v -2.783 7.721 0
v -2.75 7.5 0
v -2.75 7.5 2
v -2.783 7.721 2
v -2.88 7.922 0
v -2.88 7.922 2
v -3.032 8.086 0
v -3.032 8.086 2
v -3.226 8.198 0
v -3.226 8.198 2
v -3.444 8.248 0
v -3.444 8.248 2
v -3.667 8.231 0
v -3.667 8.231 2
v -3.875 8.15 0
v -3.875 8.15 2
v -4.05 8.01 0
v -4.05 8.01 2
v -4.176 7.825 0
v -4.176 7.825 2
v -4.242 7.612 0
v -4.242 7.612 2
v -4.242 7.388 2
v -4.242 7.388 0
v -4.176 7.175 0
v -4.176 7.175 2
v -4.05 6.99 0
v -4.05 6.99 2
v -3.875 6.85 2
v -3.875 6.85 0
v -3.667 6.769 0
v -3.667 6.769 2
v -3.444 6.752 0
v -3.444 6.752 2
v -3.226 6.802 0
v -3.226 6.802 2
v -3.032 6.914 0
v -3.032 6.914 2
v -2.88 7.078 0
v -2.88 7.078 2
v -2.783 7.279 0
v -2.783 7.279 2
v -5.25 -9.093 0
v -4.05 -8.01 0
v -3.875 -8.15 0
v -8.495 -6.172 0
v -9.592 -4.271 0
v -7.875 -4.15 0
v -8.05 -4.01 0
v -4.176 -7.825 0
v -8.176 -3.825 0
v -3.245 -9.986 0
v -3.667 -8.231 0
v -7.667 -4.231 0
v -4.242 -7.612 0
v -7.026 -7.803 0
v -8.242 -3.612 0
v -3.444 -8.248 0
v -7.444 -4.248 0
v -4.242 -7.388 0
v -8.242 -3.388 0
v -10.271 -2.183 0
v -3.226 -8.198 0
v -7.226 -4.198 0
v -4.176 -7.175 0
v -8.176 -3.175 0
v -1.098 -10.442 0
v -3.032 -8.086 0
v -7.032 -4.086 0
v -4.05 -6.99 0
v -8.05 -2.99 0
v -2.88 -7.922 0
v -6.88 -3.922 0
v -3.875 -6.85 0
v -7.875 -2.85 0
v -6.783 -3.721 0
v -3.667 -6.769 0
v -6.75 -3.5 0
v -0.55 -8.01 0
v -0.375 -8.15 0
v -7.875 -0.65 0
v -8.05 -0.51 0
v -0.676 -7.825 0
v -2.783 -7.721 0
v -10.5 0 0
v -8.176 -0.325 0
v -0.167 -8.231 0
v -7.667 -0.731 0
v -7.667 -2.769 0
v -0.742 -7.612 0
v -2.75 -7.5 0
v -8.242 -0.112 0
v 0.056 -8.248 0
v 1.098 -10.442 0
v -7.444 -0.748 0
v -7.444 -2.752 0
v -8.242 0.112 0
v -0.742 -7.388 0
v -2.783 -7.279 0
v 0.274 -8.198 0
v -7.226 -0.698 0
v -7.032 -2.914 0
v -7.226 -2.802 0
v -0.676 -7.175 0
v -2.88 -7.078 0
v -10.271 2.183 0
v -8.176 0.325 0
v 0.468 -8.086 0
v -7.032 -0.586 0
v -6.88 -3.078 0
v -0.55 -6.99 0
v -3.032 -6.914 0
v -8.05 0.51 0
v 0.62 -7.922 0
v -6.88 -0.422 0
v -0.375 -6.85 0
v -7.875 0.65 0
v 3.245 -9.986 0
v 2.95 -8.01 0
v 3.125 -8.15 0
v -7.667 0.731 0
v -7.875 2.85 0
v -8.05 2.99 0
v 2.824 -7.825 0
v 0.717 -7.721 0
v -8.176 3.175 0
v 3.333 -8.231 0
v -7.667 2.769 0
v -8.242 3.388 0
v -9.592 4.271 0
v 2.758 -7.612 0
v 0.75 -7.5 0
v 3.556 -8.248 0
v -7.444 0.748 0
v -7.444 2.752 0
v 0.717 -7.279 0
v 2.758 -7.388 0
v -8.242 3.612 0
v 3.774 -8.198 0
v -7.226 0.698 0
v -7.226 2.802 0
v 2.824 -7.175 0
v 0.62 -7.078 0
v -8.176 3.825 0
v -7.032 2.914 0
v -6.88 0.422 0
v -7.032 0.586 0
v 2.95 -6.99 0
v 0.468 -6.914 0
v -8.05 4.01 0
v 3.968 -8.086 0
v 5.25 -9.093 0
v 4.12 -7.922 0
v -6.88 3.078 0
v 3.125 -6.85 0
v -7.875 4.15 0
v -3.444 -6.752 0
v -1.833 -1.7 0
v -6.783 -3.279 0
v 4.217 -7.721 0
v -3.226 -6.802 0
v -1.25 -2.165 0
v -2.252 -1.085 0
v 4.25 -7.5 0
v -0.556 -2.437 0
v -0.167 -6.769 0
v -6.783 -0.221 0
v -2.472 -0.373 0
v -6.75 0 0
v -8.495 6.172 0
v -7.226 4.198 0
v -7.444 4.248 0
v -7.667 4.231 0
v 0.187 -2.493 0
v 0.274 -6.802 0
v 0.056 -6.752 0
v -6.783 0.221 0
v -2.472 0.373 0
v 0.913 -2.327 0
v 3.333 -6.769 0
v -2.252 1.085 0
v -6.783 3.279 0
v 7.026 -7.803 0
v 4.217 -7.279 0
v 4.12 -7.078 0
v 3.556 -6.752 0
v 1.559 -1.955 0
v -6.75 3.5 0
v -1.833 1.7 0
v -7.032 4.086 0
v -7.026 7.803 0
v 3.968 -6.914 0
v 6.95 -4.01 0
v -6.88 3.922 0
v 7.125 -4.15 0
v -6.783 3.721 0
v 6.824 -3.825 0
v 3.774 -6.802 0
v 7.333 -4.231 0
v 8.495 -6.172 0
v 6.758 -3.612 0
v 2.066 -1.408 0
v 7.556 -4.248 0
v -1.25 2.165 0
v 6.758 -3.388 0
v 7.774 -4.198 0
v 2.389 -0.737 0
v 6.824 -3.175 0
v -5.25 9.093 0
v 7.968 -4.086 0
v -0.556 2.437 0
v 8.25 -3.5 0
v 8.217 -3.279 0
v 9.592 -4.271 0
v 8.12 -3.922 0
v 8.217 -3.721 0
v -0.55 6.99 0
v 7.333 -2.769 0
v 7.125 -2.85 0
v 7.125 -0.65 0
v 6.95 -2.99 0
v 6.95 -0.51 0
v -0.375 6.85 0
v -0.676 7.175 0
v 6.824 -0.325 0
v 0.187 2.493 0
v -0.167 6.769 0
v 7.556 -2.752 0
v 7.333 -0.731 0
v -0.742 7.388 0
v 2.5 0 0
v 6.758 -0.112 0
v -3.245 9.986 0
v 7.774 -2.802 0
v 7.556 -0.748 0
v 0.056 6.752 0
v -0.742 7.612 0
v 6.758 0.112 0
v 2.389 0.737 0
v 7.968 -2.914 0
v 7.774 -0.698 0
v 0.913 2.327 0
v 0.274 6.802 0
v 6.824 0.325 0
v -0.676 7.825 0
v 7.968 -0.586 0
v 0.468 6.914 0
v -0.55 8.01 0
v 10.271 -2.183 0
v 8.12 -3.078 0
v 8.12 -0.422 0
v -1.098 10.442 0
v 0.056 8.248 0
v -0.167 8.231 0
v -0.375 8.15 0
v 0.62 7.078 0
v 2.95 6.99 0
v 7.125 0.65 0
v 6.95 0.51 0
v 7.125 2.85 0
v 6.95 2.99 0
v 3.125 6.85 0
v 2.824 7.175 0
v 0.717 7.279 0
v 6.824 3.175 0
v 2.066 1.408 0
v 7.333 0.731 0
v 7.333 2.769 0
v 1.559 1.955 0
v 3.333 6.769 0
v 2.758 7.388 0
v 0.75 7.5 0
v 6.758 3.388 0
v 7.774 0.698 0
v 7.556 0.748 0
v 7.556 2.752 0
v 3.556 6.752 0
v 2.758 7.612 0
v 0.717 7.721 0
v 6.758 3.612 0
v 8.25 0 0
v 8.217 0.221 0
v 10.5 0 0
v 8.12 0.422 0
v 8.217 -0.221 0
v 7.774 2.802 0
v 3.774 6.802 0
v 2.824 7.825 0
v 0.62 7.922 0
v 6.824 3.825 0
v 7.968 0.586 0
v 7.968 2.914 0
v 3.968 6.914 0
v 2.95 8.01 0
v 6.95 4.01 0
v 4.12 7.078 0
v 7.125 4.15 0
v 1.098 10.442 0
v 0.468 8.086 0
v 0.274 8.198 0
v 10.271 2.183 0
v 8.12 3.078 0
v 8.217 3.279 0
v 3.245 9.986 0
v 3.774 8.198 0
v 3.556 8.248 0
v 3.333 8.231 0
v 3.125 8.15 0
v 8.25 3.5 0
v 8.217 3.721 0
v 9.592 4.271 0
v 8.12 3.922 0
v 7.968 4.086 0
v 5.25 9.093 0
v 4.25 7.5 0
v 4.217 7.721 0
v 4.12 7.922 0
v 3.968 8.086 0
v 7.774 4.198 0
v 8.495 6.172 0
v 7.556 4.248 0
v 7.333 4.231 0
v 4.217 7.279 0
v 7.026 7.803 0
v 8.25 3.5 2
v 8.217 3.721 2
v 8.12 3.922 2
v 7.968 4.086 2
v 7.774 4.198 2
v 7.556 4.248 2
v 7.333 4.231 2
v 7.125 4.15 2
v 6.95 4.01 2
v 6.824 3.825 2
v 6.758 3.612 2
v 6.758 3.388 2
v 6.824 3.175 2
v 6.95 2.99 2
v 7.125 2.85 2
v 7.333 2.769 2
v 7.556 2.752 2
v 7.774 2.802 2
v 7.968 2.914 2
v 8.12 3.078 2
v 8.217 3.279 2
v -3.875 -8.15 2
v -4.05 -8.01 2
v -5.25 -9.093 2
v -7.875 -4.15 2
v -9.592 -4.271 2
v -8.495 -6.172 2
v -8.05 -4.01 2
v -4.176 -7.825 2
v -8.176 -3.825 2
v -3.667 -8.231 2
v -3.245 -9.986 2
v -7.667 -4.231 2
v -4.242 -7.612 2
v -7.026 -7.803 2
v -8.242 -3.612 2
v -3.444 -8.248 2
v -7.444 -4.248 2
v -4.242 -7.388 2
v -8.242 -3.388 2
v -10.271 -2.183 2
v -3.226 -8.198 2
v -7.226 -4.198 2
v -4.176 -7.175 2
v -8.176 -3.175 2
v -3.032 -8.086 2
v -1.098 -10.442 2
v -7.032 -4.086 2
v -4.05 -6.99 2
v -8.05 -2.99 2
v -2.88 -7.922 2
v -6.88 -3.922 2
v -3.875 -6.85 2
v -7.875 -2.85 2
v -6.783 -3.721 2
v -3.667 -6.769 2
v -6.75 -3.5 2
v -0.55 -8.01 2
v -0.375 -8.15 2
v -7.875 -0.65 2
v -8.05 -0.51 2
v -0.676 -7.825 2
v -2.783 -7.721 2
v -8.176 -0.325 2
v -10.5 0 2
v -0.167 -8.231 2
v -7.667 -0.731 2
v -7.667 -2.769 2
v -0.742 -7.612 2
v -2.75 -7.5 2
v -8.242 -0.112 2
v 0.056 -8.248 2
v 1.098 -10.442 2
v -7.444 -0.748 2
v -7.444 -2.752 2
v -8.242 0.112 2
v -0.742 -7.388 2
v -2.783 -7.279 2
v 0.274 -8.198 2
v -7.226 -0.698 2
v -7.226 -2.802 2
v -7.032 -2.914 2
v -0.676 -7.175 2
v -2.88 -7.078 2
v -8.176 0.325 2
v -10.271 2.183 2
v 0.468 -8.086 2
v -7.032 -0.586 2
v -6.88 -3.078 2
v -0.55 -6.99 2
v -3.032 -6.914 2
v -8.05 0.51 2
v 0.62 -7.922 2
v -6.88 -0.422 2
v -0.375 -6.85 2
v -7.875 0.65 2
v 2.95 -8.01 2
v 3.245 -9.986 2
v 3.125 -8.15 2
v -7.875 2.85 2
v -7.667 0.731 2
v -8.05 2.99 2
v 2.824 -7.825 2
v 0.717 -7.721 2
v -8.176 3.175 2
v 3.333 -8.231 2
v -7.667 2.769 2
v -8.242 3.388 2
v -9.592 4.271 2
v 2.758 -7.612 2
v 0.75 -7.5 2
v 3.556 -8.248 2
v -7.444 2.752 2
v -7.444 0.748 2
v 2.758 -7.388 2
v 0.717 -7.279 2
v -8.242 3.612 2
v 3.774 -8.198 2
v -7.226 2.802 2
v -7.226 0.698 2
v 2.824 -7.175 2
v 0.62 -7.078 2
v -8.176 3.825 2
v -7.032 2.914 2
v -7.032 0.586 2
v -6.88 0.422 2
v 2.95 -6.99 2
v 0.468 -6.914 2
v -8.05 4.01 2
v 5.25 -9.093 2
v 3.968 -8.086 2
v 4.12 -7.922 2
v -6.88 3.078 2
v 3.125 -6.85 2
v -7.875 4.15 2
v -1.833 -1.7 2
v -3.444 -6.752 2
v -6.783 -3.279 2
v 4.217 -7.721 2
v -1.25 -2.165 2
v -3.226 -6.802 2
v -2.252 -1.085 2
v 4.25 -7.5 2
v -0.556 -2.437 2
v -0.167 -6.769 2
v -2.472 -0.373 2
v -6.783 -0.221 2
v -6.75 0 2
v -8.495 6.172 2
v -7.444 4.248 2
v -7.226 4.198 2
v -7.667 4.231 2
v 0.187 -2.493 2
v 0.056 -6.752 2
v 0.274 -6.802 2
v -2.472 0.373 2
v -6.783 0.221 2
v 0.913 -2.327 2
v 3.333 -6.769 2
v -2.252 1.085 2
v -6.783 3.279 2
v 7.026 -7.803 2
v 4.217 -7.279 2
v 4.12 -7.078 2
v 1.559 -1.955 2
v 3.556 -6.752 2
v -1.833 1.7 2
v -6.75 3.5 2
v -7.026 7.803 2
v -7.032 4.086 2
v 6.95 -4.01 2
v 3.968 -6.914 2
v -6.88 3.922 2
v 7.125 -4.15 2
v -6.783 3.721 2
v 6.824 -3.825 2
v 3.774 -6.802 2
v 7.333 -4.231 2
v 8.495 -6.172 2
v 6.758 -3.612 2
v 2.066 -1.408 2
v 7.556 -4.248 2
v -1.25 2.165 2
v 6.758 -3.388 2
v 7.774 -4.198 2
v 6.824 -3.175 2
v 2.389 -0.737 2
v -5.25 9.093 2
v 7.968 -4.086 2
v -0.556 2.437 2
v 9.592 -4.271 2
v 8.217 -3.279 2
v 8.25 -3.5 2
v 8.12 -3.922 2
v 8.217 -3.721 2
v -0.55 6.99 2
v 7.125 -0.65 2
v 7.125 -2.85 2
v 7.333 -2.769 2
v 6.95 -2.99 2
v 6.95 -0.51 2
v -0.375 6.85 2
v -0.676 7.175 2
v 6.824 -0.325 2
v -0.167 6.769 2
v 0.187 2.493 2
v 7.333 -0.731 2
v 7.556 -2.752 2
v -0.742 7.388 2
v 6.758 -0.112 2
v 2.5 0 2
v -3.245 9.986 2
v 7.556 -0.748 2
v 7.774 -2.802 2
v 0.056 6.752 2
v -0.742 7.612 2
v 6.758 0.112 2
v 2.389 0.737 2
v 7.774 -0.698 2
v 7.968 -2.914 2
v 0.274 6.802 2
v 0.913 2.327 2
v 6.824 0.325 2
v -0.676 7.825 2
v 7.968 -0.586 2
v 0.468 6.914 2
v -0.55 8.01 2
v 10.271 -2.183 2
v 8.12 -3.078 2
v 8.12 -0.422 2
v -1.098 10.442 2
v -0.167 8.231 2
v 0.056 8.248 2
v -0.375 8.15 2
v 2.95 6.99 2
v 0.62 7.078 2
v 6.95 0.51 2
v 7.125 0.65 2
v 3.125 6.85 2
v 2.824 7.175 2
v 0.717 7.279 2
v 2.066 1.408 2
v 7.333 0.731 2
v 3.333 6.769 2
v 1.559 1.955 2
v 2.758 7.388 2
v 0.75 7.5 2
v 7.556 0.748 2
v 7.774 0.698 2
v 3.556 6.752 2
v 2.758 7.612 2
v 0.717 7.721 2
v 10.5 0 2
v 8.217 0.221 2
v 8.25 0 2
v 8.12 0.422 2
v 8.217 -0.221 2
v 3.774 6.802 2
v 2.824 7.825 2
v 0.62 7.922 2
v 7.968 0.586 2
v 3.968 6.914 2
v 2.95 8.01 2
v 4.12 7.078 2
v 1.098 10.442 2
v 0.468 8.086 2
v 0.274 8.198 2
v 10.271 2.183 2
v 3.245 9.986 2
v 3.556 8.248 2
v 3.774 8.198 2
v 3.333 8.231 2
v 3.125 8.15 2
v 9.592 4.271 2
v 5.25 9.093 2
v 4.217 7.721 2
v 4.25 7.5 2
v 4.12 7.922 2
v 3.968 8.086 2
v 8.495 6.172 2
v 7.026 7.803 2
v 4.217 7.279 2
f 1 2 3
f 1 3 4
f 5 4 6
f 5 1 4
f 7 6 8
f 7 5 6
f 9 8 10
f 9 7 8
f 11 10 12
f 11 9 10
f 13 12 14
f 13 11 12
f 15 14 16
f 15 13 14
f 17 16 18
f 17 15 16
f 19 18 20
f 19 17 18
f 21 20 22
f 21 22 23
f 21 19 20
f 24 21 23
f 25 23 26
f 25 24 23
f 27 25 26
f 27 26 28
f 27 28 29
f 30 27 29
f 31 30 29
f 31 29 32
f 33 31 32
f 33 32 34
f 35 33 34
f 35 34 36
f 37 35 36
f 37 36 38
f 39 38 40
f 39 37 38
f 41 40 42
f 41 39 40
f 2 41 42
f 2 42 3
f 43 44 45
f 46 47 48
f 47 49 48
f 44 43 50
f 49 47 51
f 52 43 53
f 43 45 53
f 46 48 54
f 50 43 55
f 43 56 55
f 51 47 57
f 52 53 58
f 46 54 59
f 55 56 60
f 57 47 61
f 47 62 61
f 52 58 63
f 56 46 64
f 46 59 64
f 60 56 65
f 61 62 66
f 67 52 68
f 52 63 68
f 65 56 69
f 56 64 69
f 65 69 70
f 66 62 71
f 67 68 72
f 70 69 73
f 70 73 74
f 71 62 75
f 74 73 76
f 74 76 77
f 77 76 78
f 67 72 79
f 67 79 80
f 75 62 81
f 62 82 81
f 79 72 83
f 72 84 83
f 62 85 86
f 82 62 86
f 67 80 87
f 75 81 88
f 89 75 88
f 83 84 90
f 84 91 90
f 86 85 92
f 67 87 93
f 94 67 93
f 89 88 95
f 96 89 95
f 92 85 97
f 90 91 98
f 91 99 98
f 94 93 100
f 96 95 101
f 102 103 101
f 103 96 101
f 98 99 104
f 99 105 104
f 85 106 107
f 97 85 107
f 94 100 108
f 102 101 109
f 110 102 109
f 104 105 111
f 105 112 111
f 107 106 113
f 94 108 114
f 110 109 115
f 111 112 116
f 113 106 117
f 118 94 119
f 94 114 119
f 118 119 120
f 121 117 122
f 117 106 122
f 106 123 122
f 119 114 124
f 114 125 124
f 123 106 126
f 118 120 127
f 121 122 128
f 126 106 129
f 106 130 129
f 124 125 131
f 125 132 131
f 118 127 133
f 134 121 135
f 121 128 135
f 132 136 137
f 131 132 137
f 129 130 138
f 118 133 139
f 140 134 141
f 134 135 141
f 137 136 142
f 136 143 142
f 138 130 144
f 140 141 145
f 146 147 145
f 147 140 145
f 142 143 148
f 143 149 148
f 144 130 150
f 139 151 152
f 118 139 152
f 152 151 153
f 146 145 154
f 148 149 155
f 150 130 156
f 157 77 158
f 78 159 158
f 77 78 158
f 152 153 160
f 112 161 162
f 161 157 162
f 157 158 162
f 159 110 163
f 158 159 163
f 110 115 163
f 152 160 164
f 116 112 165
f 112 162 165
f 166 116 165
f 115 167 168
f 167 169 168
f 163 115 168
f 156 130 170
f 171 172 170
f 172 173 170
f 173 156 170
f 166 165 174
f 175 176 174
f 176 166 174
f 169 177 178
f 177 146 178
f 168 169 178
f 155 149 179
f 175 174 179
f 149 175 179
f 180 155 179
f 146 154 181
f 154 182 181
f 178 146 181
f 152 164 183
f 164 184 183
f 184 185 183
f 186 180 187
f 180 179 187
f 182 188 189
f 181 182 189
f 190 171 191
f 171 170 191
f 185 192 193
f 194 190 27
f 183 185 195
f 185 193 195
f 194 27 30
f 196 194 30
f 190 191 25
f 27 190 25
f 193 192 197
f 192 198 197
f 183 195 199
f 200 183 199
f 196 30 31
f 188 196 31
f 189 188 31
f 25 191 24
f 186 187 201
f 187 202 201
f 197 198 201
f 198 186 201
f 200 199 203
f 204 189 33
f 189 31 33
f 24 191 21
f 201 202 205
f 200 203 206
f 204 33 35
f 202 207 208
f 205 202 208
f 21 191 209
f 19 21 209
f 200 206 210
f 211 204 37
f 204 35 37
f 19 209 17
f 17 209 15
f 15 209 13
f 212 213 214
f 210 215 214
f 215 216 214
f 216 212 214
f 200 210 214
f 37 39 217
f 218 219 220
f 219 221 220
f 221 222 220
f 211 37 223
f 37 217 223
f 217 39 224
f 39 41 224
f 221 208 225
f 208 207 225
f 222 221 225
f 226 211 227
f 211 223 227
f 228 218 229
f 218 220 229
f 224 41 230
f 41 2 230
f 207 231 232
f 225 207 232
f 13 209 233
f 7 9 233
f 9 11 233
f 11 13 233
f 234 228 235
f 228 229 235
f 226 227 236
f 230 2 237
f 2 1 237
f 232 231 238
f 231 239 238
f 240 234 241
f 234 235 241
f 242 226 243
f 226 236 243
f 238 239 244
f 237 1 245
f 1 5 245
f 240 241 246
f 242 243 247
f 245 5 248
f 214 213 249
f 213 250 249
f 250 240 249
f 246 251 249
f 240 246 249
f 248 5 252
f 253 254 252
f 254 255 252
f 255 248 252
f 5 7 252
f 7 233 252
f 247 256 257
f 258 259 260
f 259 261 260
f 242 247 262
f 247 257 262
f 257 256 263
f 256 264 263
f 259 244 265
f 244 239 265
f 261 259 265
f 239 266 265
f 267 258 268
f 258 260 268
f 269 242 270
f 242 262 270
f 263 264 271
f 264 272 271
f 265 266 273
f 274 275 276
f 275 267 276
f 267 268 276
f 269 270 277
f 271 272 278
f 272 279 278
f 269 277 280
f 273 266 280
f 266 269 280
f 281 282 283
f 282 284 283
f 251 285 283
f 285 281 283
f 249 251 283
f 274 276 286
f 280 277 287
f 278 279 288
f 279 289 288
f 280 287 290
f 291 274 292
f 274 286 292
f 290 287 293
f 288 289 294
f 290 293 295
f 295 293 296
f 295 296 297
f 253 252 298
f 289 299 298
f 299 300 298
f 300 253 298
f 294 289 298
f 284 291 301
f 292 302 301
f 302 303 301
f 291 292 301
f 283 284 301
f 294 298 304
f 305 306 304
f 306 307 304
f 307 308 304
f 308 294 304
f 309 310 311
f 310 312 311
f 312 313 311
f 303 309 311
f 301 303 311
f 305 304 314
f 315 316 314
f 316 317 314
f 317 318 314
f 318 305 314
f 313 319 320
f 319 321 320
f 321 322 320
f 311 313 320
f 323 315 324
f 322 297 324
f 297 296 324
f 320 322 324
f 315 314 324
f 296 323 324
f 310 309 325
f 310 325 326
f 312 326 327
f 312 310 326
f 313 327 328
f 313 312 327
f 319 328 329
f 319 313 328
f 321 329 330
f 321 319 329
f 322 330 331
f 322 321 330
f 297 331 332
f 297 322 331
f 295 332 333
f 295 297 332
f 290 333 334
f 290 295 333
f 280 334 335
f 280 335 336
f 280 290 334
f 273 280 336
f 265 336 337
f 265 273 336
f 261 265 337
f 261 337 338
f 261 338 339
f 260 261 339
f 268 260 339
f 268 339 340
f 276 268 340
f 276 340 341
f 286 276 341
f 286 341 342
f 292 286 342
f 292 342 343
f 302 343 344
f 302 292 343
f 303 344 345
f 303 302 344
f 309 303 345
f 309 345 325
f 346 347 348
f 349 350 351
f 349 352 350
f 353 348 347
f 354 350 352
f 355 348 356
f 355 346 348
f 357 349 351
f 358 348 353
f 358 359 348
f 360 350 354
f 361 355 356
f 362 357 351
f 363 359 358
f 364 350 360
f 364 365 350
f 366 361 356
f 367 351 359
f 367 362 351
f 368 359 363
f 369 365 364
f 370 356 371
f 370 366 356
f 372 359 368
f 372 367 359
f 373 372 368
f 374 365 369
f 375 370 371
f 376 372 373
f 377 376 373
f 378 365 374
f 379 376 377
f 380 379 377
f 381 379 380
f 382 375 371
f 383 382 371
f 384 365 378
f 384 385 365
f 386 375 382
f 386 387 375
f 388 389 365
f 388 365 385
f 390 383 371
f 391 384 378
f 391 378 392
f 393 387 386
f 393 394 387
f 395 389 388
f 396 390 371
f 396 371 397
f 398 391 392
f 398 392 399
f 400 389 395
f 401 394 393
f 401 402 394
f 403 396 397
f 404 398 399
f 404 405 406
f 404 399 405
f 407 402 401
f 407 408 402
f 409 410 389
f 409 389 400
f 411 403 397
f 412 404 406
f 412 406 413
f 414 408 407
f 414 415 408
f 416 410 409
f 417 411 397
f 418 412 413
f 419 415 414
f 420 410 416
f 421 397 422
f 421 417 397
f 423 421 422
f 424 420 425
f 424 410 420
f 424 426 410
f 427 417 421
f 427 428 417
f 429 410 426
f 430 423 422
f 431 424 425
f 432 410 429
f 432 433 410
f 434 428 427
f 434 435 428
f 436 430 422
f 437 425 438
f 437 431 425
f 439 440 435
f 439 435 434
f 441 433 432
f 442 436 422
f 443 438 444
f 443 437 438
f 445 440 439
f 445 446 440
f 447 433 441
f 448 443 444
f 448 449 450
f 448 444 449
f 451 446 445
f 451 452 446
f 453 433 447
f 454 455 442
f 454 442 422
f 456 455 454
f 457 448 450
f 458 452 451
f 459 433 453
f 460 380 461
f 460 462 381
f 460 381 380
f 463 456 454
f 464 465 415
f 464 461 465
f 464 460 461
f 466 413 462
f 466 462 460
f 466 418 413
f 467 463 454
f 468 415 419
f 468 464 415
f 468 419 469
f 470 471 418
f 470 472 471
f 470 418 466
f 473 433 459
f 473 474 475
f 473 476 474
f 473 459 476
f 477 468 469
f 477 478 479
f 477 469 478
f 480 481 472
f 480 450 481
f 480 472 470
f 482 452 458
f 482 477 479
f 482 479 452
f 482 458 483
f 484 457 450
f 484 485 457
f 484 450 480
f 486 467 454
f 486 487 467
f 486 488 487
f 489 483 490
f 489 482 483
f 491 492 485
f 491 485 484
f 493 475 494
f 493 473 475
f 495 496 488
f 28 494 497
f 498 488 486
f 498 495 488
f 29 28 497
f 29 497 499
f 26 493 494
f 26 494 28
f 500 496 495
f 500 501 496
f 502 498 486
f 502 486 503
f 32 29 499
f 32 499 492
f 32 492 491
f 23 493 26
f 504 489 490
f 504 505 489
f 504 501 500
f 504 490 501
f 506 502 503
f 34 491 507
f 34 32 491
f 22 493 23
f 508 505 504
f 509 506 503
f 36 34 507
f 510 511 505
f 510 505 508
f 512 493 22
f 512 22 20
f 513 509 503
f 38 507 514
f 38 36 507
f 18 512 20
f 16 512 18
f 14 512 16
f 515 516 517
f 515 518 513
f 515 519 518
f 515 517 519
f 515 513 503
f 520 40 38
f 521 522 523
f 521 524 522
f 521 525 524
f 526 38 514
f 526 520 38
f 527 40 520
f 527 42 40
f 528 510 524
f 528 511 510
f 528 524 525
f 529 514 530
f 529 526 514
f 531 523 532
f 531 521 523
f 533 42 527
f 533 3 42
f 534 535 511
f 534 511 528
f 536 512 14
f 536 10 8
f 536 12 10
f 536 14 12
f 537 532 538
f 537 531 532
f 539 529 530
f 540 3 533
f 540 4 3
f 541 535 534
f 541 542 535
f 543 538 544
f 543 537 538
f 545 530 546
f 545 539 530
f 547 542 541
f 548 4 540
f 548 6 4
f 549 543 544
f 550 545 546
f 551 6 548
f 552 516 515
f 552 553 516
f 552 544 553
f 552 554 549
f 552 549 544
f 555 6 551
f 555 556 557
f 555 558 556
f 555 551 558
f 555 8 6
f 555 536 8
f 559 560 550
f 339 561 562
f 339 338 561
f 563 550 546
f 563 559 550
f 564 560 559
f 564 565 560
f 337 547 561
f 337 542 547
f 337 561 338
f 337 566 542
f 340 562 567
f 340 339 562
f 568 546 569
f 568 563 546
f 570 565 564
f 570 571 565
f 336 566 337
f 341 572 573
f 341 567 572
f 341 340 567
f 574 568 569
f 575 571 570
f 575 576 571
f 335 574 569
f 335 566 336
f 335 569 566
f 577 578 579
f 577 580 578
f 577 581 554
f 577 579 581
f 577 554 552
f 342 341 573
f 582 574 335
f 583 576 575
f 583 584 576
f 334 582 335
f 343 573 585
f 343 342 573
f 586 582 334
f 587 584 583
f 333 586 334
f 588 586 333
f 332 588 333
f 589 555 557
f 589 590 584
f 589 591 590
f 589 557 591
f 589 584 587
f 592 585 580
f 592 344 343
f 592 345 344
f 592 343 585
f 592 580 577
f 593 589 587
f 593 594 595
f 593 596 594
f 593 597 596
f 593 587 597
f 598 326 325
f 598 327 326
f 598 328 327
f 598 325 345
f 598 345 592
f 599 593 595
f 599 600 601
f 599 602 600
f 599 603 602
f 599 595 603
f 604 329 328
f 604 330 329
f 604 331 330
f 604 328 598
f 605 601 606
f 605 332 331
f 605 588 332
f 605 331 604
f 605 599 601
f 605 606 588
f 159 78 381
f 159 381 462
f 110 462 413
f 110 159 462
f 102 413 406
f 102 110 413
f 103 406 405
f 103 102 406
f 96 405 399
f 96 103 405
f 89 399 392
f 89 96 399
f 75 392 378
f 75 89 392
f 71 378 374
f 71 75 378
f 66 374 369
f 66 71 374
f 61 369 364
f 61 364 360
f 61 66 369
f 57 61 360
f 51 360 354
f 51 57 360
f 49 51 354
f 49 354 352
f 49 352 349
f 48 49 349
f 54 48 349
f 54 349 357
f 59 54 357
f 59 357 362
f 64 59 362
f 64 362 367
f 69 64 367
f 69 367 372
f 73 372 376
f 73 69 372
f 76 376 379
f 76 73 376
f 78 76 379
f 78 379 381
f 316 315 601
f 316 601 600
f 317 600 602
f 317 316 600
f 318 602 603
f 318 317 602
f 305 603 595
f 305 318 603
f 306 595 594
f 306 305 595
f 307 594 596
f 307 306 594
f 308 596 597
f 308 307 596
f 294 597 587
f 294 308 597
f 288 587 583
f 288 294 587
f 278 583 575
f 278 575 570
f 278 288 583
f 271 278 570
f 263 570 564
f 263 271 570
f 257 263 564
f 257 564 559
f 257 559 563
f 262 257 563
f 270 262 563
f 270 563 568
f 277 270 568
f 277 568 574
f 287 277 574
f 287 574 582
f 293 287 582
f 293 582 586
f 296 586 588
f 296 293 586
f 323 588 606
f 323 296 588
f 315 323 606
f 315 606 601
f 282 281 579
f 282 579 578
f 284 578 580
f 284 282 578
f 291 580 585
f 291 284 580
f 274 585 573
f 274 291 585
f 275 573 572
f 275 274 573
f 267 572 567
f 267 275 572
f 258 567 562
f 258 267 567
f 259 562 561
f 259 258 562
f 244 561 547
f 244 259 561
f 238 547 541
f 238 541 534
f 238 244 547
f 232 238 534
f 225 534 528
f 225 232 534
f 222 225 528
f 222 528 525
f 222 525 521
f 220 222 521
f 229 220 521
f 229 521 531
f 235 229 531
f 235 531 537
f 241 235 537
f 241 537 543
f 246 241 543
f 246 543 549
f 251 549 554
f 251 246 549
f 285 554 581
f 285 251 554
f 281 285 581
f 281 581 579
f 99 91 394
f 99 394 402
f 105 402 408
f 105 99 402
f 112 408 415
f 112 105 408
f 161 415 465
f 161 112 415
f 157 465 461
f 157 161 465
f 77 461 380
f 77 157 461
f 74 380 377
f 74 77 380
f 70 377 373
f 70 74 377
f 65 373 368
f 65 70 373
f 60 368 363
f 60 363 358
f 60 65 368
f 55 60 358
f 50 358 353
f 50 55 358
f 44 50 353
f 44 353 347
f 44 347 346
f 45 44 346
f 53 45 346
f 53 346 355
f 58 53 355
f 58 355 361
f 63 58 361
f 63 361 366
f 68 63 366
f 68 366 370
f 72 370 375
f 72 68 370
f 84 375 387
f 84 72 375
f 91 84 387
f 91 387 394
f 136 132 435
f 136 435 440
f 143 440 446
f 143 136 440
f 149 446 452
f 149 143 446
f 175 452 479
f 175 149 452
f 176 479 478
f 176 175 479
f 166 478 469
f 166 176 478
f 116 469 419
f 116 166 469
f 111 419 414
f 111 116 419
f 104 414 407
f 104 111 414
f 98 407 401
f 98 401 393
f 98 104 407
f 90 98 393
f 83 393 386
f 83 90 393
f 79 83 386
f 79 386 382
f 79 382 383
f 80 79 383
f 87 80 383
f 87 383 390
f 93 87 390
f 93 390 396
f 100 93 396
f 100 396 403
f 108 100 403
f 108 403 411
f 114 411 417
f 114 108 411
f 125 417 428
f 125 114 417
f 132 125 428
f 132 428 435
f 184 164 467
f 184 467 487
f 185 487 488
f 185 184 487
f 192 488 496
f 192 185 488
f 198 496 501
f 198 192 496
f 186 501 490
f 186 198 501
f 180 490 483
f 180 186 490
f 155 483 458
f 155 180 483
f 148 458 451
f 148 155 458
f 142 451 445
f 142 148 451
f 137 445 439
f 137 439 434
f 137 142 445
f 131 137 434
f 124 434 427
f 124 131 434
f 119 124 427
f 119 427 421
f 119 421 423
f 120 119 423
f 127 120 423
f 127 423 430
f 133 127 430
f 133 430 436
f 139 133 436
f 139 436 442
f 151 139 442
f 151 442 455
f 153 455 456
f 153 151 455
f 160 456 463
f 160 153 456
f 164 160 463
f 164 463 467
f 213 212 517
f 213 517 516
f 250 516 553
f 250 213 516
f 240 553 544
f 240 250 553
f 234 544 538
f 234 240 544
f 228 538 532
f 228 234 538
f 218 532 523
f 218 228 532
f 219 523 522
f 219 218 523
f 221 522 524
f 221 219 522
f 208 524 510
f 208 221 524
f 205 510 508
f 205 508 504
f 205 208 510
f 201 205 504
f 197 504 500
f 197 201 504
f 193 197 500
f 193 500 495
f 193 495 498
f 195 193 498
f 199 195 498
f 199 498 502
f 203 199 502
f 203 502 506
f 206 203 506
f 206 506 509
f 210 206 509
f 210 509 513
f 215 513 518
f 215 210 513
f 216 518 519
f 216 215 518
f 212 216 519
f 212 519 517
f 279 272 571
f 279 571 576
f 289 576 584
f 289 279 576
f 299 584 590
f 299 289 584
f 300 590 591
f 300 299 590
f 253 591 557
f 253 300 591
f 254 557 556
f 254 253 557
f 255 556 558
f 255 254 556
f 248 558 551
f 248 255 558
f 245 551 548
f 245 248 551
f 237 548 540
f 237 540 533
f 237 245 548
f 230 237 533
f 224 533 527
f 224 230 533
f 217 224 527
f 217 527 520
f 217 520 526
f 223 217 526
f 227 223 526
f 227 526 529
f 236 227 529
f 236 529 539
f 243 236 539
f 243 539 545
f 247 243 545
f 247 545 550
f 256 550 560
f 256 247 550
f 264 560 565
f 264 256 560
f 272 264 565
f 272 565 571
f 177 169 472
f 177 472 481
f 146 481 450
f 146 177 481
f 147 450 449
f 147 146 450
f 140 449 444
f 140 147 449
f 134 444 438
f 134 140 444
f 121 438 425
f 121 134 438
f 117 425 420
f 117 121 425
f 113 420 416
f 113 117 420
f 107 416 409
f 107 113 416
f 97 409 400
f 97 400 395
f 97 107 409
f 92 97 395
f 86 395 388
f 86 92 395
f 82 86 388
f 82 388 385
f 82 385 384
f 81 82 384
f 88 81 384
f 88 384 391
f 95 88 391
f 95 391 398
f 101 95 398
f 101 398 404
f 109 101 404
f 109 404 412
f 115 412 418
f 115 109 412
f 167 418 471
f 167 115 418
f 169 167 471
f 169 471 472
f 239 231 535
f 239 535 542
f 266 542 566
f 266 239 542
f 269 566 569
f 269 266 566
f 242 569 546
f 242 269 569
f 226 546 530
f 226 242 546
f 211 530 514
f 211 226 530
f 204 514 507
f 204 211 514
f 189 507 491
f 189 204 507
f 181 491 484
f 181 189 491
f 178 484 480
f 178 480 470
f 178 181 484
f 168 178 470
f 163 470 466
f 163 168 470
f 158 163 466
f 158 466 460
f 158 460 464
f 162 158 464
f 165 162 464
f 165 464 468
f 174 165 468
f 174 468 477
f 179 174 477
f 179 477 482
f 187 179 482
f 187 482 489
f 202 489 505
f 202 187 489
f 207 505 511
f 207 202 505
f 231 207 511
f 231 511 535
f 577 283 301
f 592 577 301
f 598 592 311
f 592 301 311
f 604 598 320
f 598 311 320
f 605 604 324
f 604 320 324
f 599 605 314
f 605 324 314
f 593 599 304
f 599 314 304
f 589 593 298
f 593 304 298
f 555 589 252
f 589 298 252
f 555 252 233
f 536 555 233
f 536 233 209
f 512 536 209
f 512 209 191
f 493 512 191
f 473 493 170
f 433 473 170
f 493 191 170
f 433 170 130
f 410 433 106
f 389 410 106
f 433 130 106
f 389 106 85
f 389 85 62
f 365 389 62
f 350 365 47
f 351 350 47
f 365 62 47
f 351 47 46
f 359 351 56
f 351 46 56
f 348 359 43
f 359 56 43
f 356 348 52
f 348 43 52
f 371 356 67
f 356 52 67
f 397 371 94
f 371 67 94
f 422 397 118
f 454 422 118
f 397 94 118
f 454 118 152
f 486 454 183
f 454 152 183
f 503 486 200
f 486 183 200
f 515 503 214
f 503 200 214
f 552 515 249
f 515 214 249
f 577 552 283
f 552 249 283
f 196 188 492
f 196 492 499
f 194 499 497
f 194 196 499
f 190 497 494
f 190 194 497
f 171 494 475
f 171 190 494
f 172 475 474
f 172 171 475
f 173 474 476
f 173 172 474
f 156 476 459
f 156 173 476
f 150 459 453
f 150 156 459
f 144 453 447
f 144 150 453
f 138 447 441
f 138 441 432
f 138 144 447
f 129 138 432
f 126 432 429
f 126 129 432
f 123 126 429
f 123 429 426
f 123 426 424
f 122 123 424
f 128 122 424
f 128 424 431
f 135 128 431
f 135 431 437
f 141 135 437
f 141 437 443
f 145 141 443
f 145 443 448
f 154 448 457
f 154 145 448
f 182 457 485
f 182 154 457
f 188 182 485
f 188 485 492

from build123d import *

# Parameters (mm, degrees)
CROQUIS1_R              = 10.5
CROQUIS1_R_2            = 0.75
CROQUIS1_R_3            = 2.5
SALIENTE_EXTRUIR1_DEPTH = 2


with BuildPart() as part:
    # Croquis1 → Saliente-Extruir1 (new body)
    with BuildSketch(Plane.XY):
        Circle(CROQUIS1_R)
        with Locations((0, 7.5)):
            Circle(CROQUIS1_R_2, mode=Mode.SUBTRACT)
        with Locations((-3.5, 7.5)):
            Circle(CROQUIS1_R_2, mode=Mode.SUBTRACT)
        with Locations((3.5, 7.5)):
            Circle(CROQUIS1_R_2, mode=Mode.SUBTRACT)
        with Locations((7.5, 3.5)):
            Circle(CROQUIS1_R_2, mode=Mode.SUBTRACT)
        with Locations((7.5, 0)):
            Circle(CROQUIS1_R_2, mode=Mode.SUBTRACT)
        with Locations((7.5, -3.5)):
            Circle(CROQUIS1_R_2, mode=Mode.SUBTRACT)
        with Locations((3.5, -7.5)):
            Circle(CROQUIS1_R_2, mode=Mode.SUBTRACT)
        with Locations((0, -7.5)):
            Circle(CROQUIS1_R_2, mode=Mode.SUBTRACT)
        with Locations((-3.5, -7.5)):
            Circle(CROQUIS1_R_2, mode=Mode.SUBTRACT)
        with Locations((-7.5, -3.5)):
            Circle(CROQUIS1_R_2, mode=Mode.SUBTRACT)
        with Locations((-7.5, 0)):
            Circle(CROQUIS1_R_2, mode=Mode.SUBTRACT)
        with Locations((-7.5, 3.5)):
            Circle(CROQUIS1_R_2, mode=Mode.SUBTRACT)
        Circle(CROQUIS1_R_3, mode=Mode.SUBTRACT)
    extrude(amount=SALIENTE_EXTRUIR1_DEPTH)


solid = part.part
